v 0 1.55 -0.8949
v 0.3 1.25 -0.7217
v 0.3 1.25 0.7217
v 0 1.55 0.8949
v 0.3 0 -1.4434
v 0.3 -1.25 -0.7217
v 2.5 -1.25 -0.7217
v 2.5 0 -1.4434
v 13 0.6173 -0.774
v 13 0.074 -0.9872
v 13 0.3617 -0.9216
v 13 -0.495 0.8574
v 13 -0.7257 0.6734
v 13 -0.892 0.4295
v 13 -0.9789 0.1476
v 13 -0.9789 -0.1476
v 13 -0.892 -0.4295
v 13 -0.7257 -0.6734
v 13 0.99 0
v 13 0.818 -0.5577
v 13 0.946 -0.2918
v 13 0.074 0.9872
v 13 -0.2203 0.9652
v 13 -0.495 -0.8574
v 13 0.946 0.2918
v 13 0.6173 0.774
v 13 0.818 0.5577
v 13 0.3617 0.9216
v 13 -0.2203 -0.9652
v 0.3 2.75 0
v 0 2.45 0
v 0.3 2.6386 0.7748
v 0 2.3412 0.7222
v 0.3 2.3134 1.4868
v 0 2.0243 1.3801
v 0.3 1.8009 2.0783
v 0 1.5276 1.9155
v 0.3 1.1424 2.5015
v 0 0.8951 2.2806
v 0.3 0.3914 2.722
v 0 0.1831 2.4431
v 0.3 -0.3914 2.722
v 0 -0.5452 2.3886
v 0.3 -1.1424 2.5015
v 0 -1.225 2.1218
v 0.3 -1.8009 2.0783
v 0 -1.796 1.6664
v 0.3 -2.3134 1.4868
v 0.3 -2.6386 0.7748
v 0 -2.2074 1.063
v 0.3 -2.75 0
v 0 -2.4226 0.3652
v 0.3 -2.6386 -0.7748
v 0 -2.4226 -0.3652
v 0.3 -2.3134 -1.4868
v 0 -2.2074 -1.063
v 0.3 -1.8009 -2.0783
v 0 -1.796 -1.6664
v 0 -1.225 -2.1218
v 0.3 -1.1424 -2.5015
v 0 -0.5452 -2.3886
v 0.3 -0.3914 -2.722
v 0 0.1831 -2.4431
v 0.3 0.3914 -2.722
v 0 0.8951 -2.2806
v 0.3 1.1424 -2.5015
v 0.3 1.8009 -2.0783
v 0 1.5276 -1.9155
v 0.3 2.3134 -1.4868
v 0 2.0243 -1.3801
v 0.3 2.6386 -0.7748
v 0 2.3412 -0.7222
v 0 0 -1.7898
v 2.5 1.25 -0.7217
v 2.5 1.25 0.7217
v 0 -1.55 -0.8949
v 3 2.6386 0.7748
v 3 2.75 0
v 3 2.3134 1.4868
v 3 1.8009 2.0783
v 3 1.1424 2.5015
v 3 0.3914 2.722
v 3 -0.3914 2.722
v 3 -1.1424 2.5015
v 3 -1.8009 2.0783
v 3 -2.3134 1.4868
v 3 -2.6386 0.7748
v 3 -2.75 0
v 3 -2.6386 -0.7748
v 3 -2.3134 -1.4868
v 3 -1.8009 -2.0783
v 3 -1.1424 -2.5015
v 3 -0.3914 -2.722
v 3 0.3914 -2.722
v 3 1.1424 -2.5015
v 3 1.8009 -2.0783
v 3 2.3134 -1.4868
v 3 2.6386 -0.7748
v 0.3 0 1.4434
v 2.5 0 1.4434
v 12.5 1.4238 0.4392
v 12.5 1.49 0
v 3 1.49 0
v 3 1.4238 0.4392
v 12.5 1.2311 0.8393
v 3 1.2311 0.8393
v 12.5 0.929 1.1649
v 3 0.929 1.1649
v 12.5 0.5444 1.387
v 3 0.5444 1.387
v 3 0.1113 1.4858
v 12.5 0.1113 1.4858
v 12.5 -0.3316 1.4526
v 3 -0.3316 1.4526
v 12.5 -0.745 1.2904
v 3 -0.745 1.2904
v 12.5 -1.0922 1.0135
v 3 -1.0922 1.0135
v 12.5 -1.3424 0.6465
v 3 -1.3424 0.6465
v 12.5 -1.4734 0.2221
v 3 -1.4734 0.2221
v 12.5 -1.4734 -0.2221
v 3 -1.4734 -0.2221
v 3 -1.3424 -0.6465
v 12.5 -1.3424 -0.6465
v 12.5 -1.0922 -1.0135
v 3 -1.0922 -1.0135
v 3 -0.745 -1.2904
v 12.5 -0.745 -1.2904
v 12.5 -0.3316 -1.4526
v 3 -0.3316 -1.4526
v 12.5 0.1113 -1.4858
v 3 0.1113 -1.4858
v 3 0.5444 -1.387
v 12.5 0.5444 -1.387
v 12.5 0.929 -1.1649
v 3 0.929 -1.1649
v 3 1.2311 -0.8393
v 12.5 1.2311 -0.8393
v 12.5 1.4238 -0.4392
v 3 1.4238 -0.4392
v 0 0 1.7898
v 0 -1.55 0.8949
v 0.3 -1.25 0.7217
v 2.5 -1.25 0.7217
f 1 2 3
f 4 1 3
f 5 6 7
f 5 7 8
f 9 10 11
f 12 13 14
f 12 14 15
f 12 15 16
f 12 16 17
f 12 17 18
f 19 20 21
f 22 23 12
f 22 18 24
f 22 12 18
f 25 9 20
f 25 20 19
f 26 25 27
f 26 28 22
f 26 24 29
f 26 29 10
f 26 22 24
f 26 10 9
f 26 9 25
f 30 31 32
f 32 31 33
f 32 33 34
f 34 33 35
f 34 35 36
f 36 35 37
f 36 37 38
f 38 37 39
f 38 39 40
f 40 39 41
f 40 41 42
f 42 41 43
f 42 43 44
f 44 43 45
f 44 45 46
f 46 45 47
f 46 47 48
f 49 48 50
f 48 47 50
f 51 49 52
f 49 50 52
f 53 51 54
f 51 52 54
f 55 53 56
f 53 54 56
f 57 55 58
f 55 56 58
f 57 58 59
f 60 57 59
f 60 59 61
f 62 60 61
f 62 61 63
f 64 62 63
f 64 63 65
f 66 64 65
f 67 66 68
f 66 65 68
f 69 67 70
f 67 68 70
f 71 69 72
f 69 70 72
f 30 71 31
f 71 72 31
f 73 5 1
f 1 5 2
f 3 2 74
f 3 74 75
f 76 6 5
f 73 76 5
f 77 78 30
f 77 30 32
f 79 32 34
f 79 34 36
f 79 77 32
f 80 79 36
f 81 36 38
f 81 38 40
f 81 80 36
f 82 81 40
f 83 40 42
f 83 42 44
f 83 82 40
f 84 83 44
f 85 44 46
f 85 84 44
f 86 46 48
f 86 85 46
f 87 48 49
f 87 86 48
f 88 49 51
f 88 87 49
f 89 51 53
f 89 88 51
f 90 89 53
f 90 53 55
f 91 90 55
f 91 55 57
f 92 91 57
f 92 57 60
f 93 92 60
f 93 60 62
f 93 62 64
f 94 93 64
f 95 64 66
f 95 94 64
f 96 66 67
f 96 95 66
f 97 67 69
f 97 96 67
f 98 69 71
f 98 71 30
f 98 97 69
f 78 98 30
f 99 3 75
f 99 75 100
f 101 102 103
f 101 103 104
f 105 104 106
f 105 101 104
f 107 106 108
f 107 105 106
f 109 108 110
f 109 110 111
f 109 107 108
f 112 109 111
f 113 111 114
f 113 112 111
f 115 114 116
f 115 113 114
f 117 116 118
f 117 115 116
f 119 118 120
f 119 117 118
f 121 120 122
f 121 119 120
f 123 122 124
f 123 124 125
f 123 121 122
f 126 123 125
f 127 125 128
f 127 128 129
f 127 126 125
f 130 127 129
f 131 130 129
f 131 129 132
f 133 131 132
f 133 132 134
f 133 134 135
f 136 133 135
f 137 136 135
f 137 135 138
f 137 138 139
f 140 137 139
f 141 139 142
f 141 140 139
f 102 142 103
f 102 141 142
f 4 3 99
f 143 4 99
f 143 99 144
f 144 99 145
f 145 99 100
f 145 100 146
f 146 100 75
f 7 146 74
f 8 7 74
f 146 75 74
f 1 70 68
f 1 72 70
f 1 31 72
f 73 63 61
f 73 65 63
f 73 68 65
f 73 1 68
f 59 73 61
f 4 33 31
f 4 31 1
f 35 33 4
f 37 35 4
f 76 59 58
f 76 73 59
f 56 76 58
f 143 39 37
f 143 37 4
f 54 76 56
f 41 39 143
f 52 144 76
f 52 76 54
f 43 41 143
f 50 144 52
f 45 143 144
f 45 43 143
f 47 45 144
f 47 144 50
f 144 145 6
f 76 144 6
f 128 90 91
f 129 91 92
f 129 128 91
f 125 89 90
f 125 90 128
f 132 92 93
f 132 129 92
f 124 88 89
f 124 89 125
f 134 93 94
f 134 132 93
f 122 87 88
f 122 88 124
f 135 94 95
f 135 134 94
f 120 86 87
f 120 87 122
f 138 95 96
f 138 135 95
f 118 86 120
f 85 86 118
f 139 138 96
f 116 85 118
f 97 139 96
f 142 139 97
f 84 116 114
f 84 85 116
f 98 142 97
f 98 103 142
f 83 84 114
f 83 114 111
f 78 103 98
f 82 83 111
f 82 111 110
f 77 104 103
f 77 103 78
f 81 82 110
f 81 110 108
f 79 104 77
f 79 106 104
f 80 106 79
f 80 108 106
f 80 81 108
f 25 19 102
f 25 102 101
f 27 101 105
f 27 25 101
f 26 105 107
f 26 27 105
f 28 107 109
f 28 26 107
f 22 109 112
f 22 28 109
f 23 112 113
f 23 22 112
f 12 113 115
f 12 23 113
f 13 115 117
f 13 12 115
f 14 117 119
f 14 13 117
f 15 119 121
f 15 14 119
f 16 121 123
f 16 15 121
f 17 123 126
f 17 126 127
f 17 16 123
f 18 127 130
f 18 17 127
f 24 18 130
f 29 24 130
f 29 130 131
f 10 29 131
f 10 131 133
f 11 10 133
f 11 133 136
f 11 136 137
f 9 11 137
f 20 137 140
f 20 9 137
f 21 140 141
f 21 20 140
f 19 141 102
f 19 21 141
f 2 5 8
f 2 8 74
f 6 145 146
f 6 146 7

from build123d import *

# Parameters (mm, degrees)
CHAMFER1_SIZE      = 0.5
CHAMFER2_SIZE      = 0.3
CUT_EXTRUDE1_DEPTH = 2.5
CHAMFER3_SIZE      = 0.3


with BuildPart() as part:
    # Sketch1 → Revolve1 (revolve)
    with BuildSketch(Plane.XY):
        Polygon((0, 0), (0, 2.75), (3, 2.75), (3, 1.49), (13, 1.49), (13, 0), align=None)
    revolve(axis=Axis((-88.705490849, 0, 0), (1, 0, 0)))

    # Chamfer1
    chamfer1_edges = [part.edges().sort_by_distance(p)[0] for p in [
        (13, -1.49, 0),
    ]]
    chamfer(chamfer1_edges, length=CHAMFER1_SIZE)

    # Chamfer2
    chamfer2_edges = [part.edges().sort_by_distance(p)[0] for p in [
        (0, -2.75, 0),
    ]]
    chamfer(chamfer2_edges, length=CHAMFER2_SIZE)

    # Sketch3 → Cut-Extrude1 (cut)
    with BuildSketch(Plane(origin=(0, 0, 0), x_dir=(0, 0, -1), z_dir=(1, 0, 0))):
        Polygon((-1.443375673, 0), (-0.721687836, -1.25), (0.721687836, -1.25), (1.443375673, 0), (0.721687836, 1.25), (-0.721687836, 1.25), align=None)
    extrude(amount=CUT_EXTRUDE1_DEPTH, mode=Mode.SUBTRACT)

    # Chamfer3
    chamfer3_edges = [part.edges().sort_by_distance(p)[0] for p in [
        (0, 0.625, 1.082531755),
        (0, -0.625, 1.082531755),
        (0, -1.25, 0),
        (0, -0.625, -1.082531755),
        (0, 0.625, -1.082531755),
        (0, 1.25, 0),
    ]]
    chamfer(chamfer3_edges, length=CHAMFER3_SIZE)


solid = part.part
